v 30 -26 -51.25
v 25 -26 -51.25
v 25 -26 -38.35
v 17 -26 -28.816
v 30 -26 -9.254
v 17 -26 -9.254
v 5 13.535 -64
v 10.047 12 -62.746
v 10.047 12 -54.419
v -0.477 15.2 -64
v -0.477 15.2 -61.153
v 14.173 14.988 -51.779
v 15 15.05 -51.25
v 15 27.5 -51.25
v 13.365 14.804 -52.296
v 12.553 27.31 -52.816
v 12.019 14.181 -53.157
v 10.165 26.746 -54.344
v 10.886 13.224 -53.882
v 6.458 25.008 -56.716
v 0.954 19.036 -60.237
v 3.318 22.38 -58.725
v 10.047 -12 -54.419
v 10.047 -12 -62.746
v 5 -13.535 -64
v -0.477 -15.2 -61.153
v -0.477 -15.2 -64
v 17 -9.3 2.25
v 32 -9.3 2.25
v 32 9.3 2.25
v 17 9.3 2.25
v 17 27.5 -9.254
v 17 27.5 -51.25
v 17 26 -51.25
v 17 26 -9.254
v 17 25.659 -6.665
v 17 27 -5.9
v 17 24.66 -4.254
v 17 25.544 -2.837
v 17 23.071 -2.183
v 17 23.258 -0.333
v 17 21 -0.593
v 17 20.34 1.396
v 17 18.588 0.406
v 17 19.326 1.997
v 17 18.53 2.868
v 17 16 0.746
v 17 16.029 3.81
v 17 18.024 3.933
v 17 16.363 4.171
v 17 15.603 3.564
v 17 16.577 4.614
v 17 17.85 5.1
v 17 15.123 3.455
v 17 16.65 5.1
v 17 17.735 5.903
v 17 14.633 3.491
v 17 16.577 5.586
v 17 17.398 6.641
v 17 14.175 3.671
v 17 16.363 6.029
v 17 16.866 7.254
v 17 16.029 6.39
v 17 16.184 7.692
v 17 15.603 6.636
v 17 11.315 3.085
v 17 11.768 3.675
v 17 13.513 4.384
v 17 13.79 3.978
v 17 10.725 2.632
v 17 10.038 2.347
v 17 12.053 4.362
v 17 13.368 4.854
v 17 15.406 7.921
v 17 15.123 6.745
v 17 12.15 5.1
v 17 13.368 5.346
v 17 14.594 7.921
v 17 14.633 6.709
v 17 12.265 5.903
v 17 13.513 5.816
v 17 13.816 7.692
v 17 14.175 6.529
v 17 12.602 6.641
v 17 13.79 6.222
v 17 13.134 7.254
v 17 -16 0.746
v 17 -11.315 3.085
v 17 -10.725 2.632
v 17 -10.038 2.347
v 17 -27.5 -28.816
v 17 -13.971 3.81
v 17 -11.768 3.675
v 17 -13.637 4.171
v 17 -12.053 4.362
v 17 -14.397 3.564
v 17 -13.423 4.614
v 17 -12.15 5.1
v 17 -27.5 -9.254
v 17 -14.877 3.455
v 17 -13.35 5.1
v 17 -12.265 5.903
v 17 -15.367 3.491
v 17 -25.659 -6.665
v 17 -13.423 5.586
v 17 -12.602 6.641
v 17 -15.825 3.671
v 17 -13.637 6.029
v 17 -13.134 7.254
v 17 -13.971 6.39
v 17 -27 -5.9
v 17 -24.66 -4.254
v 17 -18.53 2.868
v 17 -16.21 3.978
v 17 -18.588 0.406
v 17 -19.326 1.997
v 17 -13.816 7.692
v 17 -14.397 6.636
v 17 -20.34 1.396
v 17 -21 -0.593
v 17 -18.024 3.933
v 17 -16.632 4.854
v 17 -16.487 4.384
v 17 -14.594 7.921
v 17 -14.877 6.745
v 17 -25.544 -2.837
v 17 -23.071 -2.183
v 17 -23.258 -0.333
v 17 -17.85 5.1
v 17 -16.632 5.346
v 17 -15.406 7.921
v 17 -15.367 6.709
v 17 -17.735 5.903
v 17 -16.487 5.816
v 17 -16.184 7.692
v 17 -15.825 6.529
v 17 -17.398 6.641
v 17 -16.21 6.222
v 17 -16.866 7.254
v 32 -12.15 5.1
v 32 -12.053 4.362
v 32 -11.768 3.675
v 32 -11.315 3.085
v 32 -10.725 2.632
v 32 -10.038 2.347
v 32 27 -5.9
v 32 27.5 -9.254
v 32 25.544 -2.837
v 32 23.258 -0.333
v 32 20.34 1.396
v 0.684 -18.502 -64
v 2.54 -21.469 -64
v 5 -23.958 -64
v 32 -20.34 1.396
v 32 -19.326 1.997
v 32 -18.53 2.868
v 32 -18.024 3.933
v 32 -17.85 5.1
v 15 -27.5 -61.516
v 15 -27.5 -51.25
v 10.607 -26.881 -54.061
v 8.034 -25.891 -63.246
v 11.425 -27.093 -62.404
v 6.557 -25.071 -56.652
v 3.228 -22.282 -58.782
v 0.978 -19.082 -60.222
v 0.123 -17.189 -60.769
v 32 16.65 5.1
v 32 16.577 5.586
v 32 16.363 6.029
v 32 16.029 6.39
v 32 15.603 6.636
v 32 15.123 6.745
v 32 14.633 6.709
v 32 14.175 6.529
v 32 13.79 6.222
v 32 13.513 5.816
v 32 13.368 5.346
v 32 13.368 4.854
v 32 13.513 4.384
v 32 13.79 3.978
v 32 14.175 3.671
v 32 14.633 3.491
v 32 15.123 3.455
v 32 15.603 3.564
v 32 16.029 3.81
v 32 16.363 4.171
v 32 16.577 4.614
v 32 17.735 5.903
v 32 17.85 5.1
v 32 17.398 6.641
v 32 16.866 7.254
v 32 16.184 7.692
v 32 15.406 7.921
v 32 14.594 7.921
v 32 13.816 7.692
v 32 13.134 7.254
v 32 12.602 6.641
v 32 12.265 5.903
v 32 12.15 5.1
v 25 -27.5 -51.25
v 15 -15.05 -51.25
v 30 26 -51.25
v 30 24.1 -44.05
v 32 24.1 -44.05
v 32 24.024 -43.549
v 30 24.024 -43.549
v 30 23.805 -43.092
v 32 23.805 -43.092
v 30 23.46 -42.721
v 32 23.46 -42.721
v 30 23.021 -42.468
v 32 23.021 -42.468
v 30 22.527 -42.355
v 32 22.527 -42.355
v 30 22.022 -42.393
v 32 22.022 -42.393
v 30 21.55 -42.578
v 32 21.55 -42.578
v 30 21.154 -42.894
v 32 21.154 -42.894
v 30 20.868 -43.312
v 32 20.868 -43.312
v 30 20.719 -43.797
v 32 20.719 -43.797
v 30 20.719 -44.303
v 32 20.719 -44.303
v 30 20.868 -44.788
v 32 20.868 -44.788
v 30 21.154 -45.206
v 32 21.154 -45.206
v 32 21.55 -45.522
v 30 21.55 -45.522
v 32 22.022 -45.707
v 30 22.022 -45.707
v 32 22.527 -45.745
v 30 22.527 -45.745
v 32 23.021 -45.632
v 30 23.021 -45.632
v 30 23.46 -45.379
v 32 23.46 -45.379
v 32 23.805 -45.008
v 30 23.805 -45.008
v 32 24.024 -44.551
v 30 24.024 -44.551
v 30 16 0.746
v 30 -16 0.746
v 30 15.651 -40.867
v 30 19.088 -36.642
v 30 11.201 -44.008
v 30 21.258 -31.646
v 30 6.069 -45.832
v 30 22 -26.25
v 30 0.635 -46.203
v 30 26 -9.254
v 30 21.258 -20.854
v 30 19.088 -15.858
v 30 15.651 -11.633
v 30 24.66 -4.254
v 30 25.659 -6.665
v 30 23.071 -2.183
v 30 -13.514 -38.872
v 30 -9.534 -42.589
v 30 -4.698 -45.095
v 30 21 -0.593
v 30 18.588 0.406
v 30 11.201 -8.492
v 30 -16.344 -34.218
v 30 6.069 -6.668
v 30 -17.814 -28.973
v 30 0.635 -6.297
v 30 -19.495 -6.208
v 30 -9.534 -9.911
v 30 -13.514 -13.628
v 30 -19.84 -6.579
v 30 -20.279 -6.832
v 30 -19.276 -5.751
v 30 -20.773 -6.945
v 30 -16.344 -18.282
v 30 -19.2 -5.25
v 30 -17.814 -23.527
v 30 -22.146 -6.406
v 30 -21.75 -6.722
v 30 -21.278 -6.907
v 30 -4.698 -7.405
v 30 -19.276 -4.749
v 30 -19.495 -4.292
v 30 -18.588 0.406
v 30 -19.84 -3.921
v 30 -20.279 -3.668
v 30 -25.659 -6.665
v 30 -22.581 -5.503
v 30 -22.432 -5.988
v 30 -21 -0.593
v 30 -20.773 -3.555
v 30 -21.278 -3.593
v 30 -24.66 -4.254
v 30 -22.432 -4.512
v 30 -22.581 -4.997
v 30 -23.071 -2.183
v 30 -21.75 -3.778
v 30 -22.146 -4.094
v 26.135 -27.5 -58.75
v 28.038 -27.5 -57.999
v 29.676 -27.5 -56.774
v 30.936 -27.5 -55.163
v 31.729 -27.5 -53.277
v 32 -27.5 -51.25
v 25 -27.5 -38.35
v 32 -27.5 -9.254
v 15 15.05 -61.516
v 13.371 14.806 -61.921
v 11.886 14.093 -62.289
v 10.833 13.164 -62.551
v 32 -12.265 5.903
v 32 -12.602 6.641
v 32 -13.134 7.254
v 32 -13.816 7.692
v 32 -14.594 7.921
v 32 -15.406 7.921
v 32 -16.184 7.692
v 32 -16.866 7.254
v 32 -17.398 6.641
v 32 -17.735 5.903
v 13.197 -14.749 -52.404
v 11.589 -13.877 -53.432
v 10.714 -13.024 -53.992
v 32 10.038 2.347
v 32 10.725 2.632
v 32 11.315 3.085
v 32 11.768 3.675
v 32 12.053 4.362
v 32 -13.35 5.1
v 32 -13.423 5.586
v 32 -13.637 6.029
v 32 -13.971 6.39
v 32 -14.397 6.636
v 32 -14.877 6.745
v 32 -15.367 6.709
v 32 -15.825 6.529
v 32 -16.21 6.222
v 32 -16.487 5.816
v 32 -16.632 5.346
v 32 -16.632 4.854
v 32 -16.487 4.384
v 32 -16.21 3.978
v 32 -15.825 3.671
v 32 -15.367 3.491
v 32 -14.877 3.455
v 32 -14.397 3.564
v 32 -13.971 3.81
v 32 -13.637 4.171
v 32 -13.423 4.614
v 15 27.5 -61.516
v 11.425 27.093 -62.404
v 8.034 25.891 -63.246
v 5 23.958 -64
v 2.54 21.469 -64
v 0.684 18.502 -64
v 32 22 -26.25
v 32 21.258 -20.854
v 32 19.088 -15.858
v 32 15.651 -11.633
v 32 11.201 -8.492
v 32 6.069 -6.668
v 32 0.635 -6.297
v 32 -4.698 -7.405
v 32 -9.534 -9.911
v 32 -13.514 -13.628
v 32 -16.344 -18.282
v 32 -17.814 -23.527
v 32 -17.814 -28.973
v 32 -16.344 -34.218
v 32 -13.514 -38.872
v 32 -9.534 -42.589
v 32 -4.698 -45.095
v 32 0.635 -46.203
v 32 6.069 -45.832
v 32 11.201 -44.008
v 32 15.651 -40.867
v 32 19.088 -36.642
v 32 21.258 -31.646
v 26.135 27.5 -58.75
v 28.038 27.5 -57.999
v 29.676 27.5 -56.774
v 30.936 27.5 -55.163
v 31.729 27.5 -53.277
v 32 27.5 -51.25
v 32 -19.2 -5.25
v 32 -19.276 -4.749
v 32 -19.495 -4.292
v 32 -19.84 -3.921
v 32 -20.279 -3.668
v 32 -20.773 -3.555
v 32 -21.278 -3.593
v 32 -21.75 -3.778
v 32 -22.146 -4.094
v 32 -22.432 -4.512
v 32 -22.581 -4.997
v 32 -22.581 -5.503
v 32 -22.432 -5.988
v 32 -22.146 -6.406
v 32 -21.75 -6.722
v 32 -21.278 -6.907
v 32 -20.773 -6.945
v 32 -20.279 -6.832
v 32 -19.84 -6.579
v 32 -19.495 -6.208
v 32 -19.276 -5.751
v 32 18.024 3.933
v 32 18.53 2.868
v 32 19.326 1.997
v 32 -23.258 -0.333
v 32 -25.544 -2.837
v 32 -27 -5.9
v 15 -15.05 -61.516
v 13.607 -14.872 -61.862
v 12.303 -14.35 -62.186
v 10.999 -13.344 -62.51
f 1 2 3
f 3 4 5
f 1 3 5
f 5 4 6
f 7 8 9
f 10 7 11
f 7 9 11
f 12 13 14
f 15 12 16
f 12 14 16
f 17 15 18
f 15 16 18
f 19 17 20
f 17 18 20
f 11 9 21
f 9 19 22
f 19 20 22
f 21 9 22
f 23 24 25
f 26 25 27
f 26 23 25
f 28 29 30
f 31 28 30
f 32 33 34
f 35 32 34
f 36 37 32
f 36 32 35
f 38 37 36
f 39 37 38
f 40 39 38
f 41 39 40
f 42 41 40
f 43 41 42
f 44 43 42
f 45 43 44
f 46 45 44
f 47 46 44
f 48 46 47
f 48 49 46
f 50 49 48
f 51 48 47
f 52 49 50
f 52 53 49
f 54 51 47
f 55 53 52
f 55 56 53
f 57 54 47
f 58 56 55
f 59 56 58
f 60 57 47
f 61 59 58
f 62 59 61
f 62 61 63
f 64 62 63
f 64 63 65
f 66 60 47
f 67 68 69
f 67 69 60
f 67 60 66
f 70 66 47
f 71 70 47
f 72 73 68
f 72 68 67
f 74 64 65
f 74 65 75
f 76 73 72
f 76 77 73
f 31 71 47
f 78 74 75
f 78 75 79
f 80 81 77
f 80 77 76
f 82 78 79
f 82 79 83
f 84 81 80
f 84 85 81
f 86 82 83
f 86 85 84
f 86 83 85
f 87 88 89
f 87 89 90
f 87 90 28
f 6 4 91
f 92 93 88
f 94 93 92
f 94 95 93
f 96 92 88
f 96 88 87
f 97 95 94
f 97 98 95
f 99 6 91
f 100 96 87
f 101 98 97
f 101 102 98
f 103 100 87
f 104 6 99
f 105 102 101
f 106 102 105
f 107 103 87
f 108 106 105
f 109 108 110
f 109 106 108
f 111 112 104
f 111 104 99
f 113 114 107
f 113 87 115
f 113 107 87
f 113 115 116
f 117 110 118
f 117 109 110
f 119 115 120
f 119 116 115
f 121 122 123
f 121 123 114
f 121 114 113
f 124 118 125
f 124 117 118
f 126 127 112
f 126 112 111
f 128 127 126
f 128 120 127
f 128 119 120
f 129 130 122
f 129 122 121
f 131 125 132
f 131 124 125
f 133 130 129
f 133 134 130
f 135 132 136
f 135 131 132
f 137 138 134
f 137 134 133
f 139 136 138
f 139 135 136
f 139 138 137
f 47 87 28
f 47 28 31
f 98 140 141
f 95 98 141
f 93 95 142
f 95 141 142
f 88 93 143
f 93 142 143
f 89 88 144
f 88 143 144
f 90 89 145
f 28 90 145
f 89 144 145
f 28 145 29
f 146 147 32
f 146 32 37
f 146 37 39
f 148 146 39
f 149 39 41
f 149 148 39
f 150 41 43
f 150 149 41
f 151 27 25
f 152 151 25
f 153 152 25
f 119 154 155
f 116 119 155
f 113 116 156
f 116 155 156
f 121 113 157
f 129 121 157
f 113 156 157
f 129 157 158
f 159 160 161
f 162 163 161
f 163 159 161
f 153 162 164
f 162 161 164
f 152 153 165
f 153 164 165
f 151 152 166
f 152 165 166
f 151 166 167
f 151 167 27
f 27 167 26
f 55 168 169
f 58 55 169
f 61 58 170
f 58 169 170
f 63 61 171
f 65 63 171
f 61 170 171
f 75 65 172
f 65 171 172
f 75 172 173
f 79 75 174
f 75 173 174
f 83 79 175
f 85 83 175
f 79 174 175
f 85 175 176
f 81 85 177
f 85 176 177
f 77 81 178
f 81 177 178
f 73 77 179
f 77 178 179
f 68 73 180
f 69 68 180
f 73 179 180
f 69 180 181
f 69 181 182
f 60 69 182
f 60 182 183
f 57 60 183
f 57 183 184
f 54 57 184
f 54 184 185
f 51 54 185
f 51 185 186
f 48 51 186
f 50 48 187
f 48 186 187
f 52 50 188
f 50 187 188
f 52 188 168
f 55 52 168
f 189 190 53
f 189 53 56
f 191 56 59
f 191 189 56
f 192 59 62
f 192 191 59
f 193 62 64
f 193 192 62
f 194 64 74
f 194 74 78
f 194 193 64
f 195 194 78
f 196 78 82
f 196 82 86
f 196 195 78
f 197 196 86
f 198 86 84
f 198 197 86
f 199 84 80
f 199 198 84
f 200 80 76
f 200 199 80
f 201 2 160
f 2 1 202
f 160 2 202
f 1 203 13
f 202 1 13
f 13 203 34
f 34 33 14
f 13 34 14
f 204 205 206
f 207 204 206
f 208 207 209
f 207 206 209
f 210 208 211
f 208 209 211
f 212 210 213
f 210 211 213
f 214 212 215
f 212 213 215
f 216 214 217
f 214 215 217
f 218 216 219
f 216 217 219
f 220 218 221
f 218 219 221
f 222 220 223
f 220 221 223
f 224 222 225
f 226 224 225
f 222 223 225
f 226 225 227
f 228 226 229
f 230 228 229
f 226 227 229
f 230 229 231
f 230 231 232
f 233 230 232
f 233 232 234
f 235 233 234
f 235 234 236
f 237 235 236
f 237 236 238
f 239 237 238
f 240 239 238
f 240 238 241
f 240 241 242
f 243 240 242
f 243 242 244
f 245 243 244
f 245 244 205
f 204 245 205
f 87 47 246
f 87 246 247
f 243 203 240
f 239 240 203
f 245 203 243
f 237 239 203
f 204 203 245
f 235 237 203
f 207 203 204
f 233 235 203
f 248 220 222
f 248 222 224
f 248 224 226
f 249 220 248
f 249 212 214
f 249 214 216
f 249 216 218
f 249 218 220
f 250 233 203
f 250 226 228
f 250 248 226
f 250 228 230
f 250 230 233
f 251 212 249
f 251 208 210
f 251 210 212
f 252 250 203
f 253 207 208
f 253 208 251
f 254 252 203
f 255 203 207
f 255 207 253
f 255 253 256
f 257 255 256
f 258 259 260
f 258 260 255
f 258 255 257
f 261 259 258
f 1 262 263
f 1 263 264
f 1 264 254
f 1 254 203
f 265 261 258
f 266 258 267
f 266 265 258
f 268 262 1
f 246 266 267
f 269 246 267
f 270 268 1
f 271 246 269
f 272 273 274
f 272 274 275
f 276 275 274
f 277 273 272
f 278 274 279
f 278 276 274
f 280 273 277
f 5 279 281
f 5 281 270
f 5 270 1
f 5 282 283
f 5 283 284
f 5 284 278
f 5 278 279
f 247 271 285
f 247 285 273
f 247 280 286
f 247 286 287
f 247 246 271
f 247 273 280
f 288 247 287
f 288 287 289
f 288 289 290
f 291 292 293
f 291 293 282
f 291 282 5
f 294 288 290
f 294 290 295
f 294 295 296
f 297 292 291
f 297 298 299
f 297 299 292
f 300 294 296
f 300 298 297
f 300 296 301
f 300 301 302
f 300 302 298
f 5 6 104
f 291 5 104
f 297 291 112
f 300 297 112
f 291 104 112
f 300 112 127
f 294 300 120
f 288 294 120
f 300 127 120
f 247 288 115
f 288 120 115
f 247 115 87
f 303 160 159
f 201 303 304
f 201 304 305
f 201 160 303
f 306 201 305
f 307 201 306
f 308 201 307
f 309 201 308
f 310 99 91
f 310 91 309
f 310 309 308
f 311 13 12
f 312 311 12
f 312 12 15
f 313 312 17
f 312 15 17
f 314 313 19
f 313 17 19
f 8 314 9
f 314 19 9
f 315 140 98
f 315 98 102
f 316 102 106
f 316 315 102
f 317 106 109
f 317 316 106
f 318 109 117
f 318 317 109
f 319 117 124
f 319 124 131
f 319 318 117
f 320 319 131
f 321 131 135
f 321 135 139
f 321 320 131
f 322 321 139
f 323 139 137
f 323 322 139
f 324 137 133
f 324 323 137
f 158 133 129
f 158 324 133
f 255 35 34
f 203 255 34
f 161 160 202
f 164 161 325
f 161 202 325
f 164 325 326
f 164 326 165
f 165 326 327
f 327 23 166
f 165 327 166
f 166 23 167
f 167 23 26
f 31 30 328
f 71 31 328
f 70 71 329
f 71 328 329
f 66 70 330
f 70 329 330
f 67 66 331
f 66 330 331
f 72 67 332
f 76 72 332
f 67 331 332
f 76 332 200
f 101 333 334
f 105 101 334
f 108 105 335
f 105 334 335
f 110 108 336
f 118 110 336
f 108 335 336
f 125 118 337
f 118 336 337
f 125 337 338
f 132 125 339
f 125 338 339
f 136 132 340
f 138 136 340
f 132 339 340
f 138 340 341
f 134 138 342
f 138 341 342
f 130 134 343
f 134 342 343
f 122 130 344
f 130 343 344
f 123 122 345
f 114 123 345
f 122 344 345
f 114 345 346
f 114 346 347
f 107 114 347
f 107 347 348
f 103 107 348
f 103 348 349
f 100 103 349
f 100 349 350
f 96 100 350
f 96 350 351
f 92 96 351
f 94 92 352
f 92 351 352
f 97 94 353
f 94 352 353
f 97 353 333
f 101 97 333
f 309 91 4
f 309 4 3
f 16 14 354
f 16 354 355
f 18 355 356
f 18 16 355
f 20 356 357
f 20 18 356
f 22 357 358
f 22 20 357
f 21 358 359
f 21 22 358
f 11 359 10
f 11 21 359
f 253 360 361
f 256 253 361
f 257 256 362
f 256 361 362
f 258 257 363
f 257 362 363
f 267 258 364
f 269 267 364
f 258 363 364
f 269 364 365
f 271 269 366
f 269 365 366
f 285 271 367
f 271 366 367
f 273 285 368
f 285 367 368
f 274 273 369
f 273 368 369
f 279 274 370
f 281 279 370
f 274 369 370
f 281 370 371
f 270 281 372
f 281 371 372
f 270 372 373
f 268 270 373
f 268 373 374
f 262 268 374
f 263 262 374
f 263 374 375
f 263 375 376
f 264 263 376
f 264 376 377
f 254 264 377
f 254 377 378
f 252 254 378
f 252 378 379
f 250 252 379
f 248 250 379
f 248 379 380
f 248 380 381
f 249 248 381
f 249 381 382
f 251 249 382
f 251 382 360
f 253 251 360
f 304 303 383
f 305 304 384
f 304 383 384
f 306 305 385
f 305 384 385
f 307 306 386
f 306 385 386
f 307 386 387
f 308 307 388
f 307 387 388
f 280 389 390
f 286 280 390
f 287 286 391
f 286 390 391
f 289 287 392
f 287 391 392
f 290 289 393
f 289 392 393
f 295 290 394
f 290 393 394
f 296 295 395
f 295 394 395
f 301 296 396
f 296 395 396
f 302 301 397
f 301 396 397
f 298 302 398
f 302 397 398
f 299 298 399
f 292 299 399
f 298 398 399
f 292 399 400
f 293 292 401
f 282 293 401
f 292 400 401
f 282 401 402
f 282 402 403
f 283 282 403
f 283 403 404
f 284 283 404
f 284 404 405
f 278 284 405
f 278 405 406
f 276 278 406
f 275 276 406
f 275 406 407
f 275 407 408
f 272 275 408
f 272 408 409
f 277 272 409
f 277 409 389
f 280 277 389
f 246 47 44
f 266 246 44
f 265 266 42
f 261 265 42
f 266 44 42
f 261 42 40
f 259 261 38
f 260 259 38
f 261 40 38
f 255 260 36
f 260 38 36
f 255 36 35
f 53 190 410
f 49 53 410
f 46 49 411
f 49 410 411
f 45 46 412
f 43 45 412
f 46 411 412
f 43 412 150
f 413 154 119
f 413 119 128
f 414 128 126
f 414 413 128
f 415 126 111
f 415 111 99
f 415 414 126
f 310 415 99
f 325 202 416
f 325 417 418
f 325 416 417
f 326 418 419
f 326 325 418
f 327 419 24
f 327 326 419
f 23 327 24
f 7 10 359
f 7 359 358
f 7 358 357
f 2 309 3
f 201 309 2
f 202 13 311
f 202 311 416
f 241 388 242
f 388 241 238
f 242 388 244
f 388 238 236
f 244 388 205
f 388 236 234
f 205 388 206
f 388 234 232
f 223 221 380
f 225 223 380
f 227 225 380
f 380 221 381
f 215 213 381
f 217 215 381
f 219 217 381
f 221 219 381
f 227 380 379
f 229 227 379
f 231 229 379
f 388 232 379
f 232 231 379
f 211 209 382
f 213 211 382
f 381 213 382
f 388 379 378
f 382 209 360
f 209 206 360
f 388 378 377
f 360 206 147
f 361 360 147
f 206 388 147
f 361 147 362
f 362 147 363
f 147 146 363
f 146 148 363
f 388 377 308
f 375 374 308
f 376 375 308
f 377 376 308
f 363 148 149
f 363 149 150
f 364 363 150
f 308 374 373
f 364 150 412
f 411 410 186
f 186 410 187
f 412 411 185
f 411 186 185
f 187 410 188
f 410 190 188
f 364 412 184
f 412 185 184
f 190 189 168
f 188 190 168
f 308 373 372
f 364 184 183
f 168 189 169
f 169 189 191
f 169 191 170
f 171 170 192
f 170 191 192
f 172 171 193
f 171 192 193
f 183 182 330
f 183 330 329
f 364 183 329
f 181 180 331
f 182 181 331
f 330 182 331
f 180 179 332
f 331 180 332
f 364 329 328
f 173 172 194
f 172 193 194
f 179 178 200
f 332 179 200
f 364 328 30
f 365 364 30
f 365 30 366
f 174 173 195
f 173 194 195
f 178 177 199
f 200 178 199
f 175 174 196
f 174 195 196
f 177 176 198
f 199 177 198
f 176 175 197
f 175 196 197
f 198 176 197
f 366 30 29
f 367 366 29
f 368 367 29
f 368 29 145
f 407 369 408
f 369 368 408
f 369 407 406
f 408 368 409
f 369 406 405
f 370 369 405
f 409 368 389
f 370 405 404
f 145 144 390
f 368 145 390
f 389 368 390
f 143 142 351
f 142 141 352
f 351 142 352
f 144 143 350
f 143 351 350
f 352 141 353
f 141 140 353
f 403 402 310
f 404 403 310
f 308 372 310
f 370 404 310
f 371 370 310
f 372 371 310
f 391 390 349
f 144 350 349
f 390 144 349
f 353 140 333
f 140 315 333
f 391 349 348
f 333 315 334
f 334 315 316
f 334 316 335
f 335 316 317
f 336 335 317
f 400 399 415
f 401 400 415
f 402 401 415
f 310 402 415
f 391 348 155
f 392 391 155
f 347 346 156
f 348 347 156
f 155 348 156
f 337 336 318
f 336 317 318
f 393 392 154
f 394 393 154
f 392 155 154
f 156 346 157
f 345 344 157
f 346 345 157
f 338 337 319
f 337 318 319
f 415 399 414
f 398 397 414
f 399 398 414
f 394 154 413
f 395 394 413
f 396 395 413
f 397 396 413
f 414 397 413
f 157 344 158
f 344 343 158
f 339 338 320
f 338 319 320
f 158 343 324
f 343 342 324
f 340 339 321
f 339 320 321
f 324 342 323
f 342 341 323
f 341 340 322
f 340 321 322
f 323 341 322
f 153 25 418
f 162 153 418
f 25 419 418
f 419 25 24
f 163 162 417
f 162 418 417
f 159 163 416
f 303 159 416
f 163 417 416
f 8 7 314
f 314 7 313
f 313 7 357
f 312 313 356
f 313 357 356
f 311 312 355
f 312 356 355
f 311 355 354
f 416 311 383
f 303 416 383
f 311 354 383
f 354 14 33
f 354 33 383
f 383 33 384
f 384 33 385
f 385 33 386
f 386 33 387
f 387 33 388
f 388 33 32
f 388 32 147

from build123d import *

# Parameters (mm, degrees)
PAD041_DEPTH    = 15
POCKET053_DEPTH = 13
SKETCH111_R     = 1.65
SKETCH111_R_2   = 1.7
SKETCH111_R_3   = 20
POCKET054_DEPTH = 15
POCKET055_DEPTH = 5
PAD042_DEPTH    = 55
POCKET056_DEPTH = 208.356468


with BuildPart() as part:
    # Sketch109 → Pad041 (new body)
    with BuildSketch(Plane.YZ):
        with BuildLine():
            Line((27.5, -9.253658), (27.5, -51.25))
            Line((27.5, -51.25), (-27.5, -51.25))
            Line((-27.5, -51.25), (-27.5, -9.253658))
            ThreePointArc((-20.340323, 1.39583), (-25.543681, -2.837417), (-27.5, -9.253658))
            ThreePointArc((-20.340323, 1.39583), (-18.530459, 2.868264), (-17.85, 5.1))
            ThreePointArc((-12.15, 5.1), (-15, 7.95), (-17.85, 5.1))
            ThreePointArc((-12.15, 5.1), (-11.315254, 3.084746), (-9.3, 2.25))
            Line((-9.3, 2.25), (9.3, 2.25))
            ThreePointArc((9.3, 2.25), (11.315254, 3.084746), (12.15, 5.1))
            ThreePointArc((17.85, 5.1), (15, 7.95), (12.15, 5.1))
            ThreePointArc((17.85, 5.1), (18.530459, 2.868264), (20.340323, 1.39583))
            ThreePointArc((27.5, -9.253658), (25.543681, -2.837417), (20.340323, 1.39583))
        make_face()
    extrude(amount=-PAD041_DEPTH)

    # Sketch110 (on Face14 of Pad041) → Pocket053 (cut)
    with BuildSketch(Plane(origin=(-15, 0, 0), x_dir=(0, -1, 0), z_dir=(-1, 0, 0))):
        with BuildLine():
            Line((-26, -9.253658), (-26, -51.25))
            Line((-26, -51.25), (26, -51.25))
            Line((26, -51.25), (26, -9.253658))
            ThreePointArc((26, -9.253658), (23.071068, -2.18259), (16, 0.746342))
            Line((-16, 0.746342), (16, 0.746342))
            ThreePointArc((-16, 0.746342), (-23.071068, -2.18259), (-26, -9.253658))
        make_face()
    extrude(amount=-POCKET053_DEPTH, mode=Mode.SUBTRACT)

    # Sketch111 (on Face4 of Pocket053) → Pocket054 (cut)
    with BuildSketch(Plane.YZ):
        with Locations((-15, 5.1)):
            Circle(SKETCH111_R)
        with Locations((15, 5.1)):
            Circle(SKETCH111_R)
        with Locations((22.4, -44.05)):
            Circle(SKETCH111_R_2)
        with Locations((-20.9, -5.25)):
            Circle(SKETCH111_R_2)
        with Locations((2, -26.25)):
            Circle(SKETCH111_R_3)
    extrude(amount=-POCKET054_DEPTH, mode=Mode.SUBTRACT)

    # Sketch112 (on Face11 of Pocket054) → Pocket055 (cut)
    with BuildSketch(Plane(origin=(0, -27.5, 0), x_dir=(0, 0, 1), z_dir=(0, -1, 0))):
        Polygon((-51.25, 15), (-28.815971, 15), (-38.35, 7), (-51.25, 7), align=None)
    extrude(amount=-POCKET055_DEPTH, mode=Mode.SUBTRACT)

    # Sketch114 (on Face7 of Pocket055) → Pad042 (join)
    with BuildSketch(Plane.XZ.offset(-27.5)):
        with BuildLine():
            ThreePointArc((-5.864892, -58.75), (-1.6403, -56.01044), (0, -51.25))
            Line((0, -51.25), (-17, -51.25))
            Line((-17, -51.25), (-36.926579, -64))
            Line((-36.926579, -64), (-27, -64))
            Line((-27, -64), (-5.864892, -58.75))
        make_face()
    extrude(amount=PAD042_DEPTH)

    # Sketch115 (on Face20 of Pad042) → Pocket056 (cut, through all)
    with BuildSketch(Plane(origin=(0, 0, -51.25), x_dir=(0, -1, 0), z_dir=(0, 0, 1))):
        with BuildLine():
            Line((-27.5, -17), (-27.5, -43))
            Line((-27.5, -43), (0, -43))
            Line((0, -43), (0, -17))
            Line((0, -17), (-15.050161, -17))
            ThreePointArc((-15.050161, -17), (-14.226455, -19.908295), (-12, -21.952695))
            Line((-12, -21.952695), (-15.2, -32.476953))
            ThreePointArc((-27.5, -17), (-24.05052, -26.884661), (-15.2, -32.476953))
        make_face()
    pocket056 = extrude(amount=-POCKET056_DEPTH, mode=Mode.SUBTRACT)

    # Mirrored001: Pocket056 across Sketch115 V_Axis
    add(pocket056.mirror(Plane(origin=(0, 0, -51.25), x_dir=(0, 0, 1), z_dir=(0, -1, 0))), mode=Mode.SUBTRACT)


with BuildPart() as part_1:
    # Body015 placement: moved
    add(part.part.moved(Location((32, 0, 0))))


solid = part_1.part
